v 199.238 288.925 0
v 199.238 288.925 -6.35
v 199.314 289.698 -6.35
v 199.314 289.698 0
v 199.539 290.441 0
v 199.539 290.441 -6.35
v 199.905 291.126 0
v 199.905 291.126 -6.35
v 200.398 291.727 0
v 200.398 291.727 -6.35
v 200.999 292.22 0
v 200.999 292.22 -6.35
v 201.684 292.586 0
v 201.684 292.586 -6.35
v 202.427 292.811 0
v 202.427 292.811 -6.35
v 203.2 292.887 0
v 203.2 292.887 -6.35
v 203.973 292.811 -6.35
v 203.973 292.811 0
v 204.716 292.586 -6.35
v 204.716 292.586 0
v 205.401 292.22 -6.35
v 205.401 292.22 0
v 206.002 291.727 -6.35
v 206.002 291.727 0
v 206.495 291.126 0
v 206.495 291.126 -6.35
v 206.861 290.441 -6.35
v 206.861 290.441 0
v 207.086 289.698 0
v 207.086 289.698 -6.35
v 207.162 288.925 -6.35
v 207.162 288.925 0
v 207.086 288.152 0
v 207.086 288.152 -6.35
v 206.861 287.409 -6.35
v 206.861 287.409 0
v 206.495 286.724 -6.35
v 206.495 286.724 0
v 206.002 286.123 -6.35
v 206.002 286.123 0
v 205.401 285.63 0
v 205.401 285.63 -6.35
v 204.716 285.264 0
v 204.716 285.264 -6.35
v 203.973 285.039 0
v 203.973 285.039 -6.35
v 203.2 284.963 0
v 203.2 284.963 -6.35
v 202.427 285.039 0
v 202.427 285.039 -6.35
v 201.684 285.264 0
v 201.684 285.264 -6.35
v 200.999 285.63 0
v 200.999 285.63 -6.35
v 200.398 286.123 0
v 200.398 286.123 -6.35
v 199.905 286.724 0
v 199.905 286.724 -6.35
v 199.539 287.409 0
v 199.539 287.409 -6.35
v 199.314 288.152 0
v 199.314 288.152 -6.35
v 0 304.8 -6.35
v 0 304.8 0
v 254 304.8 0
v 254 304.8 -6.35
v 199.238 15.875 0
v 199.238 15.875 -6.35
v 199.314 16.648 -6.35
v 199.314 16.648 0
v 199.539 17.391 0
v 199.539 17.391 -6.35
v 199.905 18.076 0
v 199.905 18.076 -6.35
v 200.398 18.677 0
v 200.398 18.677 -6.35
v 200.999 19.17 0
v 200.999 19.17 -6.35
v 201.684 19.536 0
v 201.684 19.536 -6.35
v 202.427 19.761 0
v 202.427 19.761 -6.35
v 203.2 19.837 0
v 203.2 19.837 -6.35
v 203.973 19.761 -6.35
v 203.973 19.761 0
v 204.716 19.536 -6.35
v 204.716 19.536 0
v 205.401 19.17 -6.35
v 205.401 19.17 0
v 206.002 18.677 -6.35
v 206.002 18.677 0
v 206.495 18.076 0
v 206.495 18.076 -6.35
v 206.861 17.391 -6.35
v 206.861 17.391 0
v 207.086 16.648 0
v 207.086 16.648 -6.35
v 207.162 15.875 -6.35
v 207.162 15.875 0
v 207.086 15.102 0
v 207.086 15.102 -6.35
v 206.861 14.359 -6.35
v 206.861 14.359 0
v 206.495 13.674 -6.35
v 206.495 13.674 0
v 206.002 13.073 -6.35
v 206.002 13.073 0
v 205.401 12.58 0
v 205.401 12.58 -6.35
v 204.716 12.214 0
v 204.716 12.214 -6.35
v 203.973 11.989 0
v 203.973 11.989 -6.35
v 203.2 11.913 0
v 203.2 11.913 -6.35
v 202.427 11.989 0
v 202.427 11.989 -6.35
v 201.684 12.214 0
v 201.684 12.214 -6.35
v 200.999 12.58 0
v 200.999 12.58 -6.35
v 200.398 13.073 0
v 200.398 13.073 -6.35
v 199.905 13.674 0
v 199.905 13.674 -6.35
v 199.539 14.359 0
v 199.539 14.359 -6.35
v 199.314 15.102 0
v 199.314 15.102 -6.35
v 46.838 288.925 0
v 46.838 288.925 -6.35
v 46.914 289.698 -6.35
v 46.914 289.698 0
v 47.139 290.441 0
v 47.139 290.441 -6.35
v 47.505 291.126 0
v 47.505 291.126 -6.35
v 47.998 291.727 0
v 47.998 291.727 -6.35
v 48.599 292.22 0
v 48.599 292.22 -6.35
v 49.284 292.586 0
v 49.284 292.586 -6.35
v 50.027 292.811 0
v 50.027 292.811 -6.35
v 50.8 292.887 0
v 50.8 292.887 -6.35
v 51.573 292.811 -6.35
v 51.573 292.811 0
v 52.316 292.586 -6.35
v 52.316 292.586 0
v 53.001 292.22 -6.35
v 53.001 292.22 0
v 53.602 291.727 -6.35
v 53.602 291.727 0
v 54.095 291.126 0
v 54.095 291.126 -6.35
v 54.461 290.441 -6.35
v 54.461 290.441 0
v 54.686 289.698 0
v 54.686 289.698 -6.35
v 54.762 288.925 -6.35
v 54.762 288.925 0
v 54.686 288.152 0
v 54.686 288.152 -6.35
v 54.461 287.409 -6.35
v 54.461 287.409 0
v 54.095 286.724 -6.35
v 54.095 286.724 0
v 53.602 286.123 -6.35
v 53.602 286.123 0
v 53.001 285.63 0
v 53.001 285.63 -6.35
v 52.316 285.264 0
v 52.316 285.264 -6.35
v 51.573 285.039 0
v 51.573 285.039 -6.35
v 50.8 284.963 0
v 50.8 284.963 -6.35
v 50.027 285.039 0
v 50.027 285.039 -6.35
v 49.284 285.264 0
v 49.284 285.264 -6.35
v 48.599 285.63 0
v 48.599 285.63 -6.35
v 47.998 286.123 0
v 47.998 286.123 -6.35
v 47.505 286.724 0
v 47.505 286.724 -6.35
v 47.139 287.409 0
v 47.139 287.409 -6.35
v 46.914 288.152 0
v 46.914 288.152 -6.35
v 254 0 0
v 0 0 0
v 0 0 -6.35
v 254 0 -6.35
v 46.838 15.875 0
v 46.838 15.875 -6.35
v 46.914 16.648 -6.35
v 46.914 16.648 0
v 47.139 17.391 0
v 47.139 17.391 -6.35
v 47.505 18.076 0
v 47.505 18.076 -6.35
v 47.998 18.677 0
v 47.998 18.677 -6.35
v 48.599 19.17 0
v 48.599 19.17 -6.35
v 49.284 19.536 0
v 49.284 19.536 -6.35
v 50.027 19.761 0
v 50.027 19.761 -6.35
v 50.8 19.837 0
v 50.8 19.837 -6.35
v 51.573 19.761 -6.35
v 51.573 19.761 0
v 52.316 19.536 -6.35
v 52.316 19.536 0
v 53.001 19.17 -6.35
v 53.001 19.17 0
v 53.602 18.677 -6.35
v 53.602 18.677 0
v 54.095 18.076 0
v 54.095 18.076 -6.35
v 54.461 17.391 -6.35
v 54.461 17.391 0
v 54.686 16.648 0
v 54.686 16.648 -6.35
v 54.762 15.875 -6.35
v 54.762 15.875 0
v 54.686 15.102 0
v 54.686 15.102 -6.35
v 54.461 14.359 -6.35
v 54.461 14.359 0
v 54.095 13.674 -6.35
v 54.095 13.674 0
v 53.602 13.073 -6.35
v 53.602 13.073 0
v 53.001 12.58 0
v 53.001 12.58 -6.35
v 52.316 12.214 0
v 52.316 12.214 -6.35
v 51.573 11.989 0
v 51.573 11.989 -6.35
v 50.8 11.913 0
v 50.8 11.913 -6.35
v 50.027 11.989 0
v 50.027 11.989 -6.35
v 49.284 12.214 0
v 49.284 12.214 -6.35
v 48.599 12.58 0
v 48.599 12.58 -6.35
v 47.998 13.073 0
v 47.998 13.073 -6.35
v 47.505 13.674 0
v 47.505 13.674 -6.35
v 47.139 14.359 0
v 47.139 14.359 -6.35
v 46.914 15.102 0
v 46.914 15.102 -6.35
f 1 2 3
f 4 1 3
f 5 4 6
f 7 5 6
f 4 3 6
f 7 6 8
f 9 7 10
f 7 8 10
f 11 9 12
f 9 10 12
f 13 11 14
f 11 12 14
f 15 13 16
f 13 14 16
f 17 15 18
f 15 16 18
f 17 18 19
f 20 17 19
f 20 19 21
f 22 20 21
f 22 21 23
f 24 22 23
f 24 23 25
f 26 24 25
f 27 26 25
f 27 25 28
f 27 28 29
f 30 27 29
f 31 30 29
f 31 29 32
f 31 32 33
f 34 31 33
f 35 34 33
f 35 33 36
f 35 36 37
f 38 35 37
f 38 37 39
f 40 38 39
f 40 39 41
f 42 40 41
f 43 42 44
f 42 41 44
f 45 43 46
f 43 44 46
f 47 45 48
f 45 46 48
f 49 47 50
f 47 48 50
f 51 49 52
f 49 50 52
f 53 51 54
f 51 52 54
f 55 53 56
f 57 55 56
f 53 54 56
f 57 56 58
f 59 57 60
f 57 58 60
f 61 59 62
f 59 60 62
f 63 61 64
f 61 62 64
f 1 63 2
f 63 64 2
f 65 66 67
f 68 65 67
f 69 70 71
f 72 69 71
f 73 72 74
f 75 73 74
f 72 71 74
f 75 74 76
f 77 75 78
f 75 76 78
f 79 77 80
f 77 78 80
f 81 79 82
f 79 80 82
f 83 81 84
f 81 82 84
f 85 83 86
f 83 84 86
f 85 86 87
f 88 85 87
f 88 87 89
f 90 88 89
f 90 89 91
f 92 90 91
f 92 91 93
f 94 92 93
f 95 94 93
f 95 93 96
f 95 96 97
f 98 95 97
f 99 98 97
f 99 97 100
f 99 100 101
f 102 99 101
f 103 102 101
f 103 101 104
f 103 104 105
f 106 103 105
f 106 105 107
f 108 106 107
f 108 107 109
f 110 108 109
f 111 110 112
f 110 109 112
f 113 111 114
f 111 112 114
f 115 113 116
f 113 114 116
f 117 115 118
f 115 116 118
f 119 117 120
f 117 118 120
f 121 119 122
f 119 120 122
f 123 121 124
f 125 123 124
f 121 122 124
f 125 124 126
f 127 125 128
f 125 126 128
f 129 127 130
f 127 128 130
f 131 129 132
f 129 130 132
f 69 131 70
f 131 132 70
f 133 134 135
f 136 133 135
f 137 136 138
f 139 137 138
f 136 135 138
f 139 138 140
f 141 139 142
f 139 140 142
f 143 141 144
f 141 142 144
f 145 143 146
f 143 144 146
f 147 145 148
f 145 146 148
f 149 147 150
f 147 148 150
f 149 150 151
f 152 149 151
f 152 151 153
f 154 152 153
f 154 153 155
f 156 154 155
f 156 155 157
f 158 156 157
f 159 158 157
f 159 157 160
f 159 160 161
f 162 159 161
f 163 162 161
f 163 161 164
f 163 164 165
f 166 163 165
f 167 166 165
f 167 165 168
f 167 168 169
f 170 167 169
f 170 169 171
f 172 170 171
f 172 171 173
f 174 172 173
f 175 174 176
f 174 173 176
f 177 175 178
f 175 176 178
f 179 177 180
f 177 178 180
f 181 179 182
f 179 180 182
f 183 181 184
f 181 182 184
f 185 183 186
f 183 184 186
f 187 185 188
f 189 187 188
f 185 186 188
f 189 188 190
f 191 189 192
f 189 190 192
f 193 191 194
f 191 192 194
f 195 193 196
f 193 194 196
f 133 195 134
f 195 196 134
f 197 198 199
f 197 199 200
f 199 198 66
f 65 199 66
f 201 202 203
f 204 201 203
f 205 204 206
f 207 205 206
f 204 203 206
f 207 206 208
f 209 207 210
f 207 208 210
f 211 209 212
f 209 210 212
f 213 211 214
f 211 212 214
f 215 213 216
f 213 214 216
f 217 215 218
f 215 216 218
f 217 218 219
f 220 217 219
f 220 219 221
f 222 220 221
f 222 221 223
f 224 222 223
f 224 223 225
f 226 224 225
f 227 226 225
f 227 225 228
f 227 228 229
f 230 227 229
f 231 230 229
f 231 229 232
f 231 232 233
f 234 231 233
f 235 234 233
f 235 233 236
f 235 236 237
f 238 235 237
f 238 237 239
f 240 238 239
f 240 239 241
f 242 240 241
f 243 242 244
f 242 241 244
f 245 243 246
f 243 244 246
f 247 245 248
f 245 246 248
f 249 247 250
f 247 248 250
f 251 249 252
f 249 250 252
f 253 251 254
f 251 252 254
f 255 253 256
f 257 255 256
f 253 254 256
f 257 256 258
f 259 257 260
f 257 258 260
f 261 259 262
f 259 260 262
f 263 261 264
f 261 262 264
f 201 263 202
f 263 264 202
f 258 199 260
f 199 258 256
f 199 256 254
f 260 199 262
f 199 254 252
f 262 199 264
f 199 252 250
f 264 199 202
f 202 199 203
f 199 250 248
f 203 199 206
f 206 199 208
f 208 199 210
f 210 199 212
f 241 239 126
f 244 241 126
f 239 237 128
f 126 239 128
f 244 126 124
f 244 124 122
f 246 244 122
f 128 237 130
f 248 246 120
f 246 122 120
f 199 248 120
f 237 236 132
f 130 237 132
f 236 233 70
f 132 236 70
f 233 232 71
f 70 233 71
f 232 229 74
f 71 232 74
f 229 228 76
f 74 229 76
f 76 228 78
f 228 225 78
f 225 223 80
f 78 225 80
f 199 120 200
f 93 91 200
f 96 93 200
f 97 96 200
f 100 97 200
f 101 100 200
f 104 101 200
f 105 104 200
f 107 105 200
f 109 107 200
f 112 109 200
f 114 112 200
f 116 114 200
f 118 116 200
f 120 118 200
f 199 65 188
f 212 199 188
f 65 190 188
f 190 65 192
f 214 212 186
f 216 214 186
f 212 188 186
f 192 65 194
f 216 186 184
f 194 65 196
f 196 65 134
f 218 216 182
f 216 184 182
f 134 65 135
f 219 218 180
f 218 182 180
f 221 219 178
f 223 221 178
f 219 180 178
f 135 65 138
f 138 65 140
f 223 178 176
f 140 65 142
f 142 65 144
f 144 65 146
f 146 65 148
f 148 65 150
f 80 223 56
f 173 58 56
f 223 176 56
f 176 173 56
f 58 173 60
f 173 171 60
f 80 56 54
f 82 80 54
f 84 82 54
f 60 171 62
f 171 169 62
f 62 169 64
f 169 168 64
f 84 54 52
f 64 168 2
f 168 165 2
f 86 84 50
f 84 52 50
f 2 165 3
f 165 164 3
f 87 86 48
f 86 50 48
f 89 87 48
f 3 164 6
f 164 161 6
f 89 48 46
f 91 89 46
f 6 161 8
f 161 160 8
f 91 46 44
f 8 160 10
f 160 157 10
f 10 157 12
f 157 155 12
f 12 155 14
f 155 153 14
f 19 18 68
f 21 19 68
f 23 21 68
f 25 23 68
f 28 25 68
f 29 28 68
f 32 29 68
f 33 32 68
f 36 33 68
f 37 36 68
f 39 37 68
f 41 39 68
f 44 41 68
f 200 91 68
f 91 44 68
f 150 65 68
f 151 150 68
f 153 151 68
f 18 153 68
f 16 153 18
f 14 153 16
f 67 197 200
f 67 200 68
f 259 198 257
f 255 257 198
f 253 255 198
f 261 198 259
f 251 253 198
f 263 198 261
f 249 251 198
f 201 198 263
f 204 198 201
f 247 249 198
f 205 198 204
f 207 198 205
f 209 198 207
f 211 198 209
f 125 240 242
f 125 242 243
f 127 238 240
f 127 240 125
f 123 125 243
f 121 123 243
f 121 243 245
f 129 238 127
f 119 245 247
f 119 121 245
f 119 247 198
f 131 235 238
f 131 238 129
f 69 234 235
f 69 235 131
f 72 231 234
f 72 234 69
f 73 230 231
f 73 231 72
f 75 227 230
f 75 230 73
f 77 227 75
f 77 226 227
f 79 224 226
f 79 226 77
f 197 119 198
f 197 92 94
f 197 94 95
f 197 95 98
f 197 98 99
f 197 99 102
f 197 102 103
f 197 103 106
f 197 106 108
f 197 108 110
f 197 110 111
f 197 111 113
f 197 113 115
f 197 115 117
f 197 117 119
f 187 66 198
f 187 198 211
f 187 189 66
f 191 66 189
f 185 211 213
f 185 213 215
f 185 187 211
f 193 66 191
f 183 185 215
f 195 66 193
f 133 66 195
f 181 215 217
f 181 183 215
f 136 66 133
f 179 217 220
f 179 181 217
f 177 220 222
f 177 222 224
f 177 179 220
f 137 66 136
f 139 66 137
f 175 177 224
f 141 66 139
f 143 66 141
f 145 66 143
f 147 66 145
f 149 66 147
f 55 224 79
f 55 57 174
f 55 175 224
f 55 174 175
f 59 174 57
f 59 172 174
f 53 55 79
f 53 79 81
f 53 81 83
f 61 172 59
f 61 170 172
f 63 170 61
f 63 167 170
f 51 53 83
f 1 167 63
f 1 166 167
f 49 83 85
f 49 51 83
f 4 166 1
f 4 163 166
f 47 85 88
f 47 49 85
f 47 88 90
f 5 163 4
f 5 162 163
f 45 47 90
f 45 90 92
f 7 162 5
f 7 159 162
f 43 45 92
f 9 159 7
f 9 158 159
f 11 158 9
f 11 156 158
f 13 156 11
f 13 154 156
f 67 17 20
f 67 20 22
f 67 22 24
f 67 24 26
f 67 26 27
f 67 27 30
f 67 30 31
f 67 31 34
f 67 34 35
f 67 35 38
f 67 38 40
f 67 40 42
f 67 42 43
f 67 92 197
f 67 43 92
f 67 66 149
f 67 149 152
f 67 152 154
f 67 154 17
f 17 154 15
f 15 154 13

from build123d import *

# Parameters (mm, degrees)
F0_W     = 254
F0_H     = 304.8
F1_DEPTH = 6.35
F3_D     = 7.9248
F4_D     = 7.9248
F5_D     = 7.9248
F6_D     = 7.9248


with BuildPart() as f1:
    # F0 (on Top) → F1 (new body)
    with BuildSketch(Plane.XY):
        with Locations((127, 152.4)):
            Rectangle(F0_W, F0_H)
    extrude(amount=-F1_DEPTH)

    # F3 (through all)
    with Locations(Plane.XY):
        with Locations((50.8, 288.925)):
            Hole(F3_D / 2)

    # F4 (through all)
    with Locations(Plane.XY):
        with Locations((203.2, 288.925)):
            Hole(F4_D / 2)

    # F5 (through all)
    with Locations(Plane.XY):
        with Locations((203.2, 15.875)):
            Hole(F5_D / 2)

    # F6 (through all)
    with Locations(Plane.XY):
        with Locations((50.8, 15.875)):
            Hole(F6_D / 2)


solid = f1.part
